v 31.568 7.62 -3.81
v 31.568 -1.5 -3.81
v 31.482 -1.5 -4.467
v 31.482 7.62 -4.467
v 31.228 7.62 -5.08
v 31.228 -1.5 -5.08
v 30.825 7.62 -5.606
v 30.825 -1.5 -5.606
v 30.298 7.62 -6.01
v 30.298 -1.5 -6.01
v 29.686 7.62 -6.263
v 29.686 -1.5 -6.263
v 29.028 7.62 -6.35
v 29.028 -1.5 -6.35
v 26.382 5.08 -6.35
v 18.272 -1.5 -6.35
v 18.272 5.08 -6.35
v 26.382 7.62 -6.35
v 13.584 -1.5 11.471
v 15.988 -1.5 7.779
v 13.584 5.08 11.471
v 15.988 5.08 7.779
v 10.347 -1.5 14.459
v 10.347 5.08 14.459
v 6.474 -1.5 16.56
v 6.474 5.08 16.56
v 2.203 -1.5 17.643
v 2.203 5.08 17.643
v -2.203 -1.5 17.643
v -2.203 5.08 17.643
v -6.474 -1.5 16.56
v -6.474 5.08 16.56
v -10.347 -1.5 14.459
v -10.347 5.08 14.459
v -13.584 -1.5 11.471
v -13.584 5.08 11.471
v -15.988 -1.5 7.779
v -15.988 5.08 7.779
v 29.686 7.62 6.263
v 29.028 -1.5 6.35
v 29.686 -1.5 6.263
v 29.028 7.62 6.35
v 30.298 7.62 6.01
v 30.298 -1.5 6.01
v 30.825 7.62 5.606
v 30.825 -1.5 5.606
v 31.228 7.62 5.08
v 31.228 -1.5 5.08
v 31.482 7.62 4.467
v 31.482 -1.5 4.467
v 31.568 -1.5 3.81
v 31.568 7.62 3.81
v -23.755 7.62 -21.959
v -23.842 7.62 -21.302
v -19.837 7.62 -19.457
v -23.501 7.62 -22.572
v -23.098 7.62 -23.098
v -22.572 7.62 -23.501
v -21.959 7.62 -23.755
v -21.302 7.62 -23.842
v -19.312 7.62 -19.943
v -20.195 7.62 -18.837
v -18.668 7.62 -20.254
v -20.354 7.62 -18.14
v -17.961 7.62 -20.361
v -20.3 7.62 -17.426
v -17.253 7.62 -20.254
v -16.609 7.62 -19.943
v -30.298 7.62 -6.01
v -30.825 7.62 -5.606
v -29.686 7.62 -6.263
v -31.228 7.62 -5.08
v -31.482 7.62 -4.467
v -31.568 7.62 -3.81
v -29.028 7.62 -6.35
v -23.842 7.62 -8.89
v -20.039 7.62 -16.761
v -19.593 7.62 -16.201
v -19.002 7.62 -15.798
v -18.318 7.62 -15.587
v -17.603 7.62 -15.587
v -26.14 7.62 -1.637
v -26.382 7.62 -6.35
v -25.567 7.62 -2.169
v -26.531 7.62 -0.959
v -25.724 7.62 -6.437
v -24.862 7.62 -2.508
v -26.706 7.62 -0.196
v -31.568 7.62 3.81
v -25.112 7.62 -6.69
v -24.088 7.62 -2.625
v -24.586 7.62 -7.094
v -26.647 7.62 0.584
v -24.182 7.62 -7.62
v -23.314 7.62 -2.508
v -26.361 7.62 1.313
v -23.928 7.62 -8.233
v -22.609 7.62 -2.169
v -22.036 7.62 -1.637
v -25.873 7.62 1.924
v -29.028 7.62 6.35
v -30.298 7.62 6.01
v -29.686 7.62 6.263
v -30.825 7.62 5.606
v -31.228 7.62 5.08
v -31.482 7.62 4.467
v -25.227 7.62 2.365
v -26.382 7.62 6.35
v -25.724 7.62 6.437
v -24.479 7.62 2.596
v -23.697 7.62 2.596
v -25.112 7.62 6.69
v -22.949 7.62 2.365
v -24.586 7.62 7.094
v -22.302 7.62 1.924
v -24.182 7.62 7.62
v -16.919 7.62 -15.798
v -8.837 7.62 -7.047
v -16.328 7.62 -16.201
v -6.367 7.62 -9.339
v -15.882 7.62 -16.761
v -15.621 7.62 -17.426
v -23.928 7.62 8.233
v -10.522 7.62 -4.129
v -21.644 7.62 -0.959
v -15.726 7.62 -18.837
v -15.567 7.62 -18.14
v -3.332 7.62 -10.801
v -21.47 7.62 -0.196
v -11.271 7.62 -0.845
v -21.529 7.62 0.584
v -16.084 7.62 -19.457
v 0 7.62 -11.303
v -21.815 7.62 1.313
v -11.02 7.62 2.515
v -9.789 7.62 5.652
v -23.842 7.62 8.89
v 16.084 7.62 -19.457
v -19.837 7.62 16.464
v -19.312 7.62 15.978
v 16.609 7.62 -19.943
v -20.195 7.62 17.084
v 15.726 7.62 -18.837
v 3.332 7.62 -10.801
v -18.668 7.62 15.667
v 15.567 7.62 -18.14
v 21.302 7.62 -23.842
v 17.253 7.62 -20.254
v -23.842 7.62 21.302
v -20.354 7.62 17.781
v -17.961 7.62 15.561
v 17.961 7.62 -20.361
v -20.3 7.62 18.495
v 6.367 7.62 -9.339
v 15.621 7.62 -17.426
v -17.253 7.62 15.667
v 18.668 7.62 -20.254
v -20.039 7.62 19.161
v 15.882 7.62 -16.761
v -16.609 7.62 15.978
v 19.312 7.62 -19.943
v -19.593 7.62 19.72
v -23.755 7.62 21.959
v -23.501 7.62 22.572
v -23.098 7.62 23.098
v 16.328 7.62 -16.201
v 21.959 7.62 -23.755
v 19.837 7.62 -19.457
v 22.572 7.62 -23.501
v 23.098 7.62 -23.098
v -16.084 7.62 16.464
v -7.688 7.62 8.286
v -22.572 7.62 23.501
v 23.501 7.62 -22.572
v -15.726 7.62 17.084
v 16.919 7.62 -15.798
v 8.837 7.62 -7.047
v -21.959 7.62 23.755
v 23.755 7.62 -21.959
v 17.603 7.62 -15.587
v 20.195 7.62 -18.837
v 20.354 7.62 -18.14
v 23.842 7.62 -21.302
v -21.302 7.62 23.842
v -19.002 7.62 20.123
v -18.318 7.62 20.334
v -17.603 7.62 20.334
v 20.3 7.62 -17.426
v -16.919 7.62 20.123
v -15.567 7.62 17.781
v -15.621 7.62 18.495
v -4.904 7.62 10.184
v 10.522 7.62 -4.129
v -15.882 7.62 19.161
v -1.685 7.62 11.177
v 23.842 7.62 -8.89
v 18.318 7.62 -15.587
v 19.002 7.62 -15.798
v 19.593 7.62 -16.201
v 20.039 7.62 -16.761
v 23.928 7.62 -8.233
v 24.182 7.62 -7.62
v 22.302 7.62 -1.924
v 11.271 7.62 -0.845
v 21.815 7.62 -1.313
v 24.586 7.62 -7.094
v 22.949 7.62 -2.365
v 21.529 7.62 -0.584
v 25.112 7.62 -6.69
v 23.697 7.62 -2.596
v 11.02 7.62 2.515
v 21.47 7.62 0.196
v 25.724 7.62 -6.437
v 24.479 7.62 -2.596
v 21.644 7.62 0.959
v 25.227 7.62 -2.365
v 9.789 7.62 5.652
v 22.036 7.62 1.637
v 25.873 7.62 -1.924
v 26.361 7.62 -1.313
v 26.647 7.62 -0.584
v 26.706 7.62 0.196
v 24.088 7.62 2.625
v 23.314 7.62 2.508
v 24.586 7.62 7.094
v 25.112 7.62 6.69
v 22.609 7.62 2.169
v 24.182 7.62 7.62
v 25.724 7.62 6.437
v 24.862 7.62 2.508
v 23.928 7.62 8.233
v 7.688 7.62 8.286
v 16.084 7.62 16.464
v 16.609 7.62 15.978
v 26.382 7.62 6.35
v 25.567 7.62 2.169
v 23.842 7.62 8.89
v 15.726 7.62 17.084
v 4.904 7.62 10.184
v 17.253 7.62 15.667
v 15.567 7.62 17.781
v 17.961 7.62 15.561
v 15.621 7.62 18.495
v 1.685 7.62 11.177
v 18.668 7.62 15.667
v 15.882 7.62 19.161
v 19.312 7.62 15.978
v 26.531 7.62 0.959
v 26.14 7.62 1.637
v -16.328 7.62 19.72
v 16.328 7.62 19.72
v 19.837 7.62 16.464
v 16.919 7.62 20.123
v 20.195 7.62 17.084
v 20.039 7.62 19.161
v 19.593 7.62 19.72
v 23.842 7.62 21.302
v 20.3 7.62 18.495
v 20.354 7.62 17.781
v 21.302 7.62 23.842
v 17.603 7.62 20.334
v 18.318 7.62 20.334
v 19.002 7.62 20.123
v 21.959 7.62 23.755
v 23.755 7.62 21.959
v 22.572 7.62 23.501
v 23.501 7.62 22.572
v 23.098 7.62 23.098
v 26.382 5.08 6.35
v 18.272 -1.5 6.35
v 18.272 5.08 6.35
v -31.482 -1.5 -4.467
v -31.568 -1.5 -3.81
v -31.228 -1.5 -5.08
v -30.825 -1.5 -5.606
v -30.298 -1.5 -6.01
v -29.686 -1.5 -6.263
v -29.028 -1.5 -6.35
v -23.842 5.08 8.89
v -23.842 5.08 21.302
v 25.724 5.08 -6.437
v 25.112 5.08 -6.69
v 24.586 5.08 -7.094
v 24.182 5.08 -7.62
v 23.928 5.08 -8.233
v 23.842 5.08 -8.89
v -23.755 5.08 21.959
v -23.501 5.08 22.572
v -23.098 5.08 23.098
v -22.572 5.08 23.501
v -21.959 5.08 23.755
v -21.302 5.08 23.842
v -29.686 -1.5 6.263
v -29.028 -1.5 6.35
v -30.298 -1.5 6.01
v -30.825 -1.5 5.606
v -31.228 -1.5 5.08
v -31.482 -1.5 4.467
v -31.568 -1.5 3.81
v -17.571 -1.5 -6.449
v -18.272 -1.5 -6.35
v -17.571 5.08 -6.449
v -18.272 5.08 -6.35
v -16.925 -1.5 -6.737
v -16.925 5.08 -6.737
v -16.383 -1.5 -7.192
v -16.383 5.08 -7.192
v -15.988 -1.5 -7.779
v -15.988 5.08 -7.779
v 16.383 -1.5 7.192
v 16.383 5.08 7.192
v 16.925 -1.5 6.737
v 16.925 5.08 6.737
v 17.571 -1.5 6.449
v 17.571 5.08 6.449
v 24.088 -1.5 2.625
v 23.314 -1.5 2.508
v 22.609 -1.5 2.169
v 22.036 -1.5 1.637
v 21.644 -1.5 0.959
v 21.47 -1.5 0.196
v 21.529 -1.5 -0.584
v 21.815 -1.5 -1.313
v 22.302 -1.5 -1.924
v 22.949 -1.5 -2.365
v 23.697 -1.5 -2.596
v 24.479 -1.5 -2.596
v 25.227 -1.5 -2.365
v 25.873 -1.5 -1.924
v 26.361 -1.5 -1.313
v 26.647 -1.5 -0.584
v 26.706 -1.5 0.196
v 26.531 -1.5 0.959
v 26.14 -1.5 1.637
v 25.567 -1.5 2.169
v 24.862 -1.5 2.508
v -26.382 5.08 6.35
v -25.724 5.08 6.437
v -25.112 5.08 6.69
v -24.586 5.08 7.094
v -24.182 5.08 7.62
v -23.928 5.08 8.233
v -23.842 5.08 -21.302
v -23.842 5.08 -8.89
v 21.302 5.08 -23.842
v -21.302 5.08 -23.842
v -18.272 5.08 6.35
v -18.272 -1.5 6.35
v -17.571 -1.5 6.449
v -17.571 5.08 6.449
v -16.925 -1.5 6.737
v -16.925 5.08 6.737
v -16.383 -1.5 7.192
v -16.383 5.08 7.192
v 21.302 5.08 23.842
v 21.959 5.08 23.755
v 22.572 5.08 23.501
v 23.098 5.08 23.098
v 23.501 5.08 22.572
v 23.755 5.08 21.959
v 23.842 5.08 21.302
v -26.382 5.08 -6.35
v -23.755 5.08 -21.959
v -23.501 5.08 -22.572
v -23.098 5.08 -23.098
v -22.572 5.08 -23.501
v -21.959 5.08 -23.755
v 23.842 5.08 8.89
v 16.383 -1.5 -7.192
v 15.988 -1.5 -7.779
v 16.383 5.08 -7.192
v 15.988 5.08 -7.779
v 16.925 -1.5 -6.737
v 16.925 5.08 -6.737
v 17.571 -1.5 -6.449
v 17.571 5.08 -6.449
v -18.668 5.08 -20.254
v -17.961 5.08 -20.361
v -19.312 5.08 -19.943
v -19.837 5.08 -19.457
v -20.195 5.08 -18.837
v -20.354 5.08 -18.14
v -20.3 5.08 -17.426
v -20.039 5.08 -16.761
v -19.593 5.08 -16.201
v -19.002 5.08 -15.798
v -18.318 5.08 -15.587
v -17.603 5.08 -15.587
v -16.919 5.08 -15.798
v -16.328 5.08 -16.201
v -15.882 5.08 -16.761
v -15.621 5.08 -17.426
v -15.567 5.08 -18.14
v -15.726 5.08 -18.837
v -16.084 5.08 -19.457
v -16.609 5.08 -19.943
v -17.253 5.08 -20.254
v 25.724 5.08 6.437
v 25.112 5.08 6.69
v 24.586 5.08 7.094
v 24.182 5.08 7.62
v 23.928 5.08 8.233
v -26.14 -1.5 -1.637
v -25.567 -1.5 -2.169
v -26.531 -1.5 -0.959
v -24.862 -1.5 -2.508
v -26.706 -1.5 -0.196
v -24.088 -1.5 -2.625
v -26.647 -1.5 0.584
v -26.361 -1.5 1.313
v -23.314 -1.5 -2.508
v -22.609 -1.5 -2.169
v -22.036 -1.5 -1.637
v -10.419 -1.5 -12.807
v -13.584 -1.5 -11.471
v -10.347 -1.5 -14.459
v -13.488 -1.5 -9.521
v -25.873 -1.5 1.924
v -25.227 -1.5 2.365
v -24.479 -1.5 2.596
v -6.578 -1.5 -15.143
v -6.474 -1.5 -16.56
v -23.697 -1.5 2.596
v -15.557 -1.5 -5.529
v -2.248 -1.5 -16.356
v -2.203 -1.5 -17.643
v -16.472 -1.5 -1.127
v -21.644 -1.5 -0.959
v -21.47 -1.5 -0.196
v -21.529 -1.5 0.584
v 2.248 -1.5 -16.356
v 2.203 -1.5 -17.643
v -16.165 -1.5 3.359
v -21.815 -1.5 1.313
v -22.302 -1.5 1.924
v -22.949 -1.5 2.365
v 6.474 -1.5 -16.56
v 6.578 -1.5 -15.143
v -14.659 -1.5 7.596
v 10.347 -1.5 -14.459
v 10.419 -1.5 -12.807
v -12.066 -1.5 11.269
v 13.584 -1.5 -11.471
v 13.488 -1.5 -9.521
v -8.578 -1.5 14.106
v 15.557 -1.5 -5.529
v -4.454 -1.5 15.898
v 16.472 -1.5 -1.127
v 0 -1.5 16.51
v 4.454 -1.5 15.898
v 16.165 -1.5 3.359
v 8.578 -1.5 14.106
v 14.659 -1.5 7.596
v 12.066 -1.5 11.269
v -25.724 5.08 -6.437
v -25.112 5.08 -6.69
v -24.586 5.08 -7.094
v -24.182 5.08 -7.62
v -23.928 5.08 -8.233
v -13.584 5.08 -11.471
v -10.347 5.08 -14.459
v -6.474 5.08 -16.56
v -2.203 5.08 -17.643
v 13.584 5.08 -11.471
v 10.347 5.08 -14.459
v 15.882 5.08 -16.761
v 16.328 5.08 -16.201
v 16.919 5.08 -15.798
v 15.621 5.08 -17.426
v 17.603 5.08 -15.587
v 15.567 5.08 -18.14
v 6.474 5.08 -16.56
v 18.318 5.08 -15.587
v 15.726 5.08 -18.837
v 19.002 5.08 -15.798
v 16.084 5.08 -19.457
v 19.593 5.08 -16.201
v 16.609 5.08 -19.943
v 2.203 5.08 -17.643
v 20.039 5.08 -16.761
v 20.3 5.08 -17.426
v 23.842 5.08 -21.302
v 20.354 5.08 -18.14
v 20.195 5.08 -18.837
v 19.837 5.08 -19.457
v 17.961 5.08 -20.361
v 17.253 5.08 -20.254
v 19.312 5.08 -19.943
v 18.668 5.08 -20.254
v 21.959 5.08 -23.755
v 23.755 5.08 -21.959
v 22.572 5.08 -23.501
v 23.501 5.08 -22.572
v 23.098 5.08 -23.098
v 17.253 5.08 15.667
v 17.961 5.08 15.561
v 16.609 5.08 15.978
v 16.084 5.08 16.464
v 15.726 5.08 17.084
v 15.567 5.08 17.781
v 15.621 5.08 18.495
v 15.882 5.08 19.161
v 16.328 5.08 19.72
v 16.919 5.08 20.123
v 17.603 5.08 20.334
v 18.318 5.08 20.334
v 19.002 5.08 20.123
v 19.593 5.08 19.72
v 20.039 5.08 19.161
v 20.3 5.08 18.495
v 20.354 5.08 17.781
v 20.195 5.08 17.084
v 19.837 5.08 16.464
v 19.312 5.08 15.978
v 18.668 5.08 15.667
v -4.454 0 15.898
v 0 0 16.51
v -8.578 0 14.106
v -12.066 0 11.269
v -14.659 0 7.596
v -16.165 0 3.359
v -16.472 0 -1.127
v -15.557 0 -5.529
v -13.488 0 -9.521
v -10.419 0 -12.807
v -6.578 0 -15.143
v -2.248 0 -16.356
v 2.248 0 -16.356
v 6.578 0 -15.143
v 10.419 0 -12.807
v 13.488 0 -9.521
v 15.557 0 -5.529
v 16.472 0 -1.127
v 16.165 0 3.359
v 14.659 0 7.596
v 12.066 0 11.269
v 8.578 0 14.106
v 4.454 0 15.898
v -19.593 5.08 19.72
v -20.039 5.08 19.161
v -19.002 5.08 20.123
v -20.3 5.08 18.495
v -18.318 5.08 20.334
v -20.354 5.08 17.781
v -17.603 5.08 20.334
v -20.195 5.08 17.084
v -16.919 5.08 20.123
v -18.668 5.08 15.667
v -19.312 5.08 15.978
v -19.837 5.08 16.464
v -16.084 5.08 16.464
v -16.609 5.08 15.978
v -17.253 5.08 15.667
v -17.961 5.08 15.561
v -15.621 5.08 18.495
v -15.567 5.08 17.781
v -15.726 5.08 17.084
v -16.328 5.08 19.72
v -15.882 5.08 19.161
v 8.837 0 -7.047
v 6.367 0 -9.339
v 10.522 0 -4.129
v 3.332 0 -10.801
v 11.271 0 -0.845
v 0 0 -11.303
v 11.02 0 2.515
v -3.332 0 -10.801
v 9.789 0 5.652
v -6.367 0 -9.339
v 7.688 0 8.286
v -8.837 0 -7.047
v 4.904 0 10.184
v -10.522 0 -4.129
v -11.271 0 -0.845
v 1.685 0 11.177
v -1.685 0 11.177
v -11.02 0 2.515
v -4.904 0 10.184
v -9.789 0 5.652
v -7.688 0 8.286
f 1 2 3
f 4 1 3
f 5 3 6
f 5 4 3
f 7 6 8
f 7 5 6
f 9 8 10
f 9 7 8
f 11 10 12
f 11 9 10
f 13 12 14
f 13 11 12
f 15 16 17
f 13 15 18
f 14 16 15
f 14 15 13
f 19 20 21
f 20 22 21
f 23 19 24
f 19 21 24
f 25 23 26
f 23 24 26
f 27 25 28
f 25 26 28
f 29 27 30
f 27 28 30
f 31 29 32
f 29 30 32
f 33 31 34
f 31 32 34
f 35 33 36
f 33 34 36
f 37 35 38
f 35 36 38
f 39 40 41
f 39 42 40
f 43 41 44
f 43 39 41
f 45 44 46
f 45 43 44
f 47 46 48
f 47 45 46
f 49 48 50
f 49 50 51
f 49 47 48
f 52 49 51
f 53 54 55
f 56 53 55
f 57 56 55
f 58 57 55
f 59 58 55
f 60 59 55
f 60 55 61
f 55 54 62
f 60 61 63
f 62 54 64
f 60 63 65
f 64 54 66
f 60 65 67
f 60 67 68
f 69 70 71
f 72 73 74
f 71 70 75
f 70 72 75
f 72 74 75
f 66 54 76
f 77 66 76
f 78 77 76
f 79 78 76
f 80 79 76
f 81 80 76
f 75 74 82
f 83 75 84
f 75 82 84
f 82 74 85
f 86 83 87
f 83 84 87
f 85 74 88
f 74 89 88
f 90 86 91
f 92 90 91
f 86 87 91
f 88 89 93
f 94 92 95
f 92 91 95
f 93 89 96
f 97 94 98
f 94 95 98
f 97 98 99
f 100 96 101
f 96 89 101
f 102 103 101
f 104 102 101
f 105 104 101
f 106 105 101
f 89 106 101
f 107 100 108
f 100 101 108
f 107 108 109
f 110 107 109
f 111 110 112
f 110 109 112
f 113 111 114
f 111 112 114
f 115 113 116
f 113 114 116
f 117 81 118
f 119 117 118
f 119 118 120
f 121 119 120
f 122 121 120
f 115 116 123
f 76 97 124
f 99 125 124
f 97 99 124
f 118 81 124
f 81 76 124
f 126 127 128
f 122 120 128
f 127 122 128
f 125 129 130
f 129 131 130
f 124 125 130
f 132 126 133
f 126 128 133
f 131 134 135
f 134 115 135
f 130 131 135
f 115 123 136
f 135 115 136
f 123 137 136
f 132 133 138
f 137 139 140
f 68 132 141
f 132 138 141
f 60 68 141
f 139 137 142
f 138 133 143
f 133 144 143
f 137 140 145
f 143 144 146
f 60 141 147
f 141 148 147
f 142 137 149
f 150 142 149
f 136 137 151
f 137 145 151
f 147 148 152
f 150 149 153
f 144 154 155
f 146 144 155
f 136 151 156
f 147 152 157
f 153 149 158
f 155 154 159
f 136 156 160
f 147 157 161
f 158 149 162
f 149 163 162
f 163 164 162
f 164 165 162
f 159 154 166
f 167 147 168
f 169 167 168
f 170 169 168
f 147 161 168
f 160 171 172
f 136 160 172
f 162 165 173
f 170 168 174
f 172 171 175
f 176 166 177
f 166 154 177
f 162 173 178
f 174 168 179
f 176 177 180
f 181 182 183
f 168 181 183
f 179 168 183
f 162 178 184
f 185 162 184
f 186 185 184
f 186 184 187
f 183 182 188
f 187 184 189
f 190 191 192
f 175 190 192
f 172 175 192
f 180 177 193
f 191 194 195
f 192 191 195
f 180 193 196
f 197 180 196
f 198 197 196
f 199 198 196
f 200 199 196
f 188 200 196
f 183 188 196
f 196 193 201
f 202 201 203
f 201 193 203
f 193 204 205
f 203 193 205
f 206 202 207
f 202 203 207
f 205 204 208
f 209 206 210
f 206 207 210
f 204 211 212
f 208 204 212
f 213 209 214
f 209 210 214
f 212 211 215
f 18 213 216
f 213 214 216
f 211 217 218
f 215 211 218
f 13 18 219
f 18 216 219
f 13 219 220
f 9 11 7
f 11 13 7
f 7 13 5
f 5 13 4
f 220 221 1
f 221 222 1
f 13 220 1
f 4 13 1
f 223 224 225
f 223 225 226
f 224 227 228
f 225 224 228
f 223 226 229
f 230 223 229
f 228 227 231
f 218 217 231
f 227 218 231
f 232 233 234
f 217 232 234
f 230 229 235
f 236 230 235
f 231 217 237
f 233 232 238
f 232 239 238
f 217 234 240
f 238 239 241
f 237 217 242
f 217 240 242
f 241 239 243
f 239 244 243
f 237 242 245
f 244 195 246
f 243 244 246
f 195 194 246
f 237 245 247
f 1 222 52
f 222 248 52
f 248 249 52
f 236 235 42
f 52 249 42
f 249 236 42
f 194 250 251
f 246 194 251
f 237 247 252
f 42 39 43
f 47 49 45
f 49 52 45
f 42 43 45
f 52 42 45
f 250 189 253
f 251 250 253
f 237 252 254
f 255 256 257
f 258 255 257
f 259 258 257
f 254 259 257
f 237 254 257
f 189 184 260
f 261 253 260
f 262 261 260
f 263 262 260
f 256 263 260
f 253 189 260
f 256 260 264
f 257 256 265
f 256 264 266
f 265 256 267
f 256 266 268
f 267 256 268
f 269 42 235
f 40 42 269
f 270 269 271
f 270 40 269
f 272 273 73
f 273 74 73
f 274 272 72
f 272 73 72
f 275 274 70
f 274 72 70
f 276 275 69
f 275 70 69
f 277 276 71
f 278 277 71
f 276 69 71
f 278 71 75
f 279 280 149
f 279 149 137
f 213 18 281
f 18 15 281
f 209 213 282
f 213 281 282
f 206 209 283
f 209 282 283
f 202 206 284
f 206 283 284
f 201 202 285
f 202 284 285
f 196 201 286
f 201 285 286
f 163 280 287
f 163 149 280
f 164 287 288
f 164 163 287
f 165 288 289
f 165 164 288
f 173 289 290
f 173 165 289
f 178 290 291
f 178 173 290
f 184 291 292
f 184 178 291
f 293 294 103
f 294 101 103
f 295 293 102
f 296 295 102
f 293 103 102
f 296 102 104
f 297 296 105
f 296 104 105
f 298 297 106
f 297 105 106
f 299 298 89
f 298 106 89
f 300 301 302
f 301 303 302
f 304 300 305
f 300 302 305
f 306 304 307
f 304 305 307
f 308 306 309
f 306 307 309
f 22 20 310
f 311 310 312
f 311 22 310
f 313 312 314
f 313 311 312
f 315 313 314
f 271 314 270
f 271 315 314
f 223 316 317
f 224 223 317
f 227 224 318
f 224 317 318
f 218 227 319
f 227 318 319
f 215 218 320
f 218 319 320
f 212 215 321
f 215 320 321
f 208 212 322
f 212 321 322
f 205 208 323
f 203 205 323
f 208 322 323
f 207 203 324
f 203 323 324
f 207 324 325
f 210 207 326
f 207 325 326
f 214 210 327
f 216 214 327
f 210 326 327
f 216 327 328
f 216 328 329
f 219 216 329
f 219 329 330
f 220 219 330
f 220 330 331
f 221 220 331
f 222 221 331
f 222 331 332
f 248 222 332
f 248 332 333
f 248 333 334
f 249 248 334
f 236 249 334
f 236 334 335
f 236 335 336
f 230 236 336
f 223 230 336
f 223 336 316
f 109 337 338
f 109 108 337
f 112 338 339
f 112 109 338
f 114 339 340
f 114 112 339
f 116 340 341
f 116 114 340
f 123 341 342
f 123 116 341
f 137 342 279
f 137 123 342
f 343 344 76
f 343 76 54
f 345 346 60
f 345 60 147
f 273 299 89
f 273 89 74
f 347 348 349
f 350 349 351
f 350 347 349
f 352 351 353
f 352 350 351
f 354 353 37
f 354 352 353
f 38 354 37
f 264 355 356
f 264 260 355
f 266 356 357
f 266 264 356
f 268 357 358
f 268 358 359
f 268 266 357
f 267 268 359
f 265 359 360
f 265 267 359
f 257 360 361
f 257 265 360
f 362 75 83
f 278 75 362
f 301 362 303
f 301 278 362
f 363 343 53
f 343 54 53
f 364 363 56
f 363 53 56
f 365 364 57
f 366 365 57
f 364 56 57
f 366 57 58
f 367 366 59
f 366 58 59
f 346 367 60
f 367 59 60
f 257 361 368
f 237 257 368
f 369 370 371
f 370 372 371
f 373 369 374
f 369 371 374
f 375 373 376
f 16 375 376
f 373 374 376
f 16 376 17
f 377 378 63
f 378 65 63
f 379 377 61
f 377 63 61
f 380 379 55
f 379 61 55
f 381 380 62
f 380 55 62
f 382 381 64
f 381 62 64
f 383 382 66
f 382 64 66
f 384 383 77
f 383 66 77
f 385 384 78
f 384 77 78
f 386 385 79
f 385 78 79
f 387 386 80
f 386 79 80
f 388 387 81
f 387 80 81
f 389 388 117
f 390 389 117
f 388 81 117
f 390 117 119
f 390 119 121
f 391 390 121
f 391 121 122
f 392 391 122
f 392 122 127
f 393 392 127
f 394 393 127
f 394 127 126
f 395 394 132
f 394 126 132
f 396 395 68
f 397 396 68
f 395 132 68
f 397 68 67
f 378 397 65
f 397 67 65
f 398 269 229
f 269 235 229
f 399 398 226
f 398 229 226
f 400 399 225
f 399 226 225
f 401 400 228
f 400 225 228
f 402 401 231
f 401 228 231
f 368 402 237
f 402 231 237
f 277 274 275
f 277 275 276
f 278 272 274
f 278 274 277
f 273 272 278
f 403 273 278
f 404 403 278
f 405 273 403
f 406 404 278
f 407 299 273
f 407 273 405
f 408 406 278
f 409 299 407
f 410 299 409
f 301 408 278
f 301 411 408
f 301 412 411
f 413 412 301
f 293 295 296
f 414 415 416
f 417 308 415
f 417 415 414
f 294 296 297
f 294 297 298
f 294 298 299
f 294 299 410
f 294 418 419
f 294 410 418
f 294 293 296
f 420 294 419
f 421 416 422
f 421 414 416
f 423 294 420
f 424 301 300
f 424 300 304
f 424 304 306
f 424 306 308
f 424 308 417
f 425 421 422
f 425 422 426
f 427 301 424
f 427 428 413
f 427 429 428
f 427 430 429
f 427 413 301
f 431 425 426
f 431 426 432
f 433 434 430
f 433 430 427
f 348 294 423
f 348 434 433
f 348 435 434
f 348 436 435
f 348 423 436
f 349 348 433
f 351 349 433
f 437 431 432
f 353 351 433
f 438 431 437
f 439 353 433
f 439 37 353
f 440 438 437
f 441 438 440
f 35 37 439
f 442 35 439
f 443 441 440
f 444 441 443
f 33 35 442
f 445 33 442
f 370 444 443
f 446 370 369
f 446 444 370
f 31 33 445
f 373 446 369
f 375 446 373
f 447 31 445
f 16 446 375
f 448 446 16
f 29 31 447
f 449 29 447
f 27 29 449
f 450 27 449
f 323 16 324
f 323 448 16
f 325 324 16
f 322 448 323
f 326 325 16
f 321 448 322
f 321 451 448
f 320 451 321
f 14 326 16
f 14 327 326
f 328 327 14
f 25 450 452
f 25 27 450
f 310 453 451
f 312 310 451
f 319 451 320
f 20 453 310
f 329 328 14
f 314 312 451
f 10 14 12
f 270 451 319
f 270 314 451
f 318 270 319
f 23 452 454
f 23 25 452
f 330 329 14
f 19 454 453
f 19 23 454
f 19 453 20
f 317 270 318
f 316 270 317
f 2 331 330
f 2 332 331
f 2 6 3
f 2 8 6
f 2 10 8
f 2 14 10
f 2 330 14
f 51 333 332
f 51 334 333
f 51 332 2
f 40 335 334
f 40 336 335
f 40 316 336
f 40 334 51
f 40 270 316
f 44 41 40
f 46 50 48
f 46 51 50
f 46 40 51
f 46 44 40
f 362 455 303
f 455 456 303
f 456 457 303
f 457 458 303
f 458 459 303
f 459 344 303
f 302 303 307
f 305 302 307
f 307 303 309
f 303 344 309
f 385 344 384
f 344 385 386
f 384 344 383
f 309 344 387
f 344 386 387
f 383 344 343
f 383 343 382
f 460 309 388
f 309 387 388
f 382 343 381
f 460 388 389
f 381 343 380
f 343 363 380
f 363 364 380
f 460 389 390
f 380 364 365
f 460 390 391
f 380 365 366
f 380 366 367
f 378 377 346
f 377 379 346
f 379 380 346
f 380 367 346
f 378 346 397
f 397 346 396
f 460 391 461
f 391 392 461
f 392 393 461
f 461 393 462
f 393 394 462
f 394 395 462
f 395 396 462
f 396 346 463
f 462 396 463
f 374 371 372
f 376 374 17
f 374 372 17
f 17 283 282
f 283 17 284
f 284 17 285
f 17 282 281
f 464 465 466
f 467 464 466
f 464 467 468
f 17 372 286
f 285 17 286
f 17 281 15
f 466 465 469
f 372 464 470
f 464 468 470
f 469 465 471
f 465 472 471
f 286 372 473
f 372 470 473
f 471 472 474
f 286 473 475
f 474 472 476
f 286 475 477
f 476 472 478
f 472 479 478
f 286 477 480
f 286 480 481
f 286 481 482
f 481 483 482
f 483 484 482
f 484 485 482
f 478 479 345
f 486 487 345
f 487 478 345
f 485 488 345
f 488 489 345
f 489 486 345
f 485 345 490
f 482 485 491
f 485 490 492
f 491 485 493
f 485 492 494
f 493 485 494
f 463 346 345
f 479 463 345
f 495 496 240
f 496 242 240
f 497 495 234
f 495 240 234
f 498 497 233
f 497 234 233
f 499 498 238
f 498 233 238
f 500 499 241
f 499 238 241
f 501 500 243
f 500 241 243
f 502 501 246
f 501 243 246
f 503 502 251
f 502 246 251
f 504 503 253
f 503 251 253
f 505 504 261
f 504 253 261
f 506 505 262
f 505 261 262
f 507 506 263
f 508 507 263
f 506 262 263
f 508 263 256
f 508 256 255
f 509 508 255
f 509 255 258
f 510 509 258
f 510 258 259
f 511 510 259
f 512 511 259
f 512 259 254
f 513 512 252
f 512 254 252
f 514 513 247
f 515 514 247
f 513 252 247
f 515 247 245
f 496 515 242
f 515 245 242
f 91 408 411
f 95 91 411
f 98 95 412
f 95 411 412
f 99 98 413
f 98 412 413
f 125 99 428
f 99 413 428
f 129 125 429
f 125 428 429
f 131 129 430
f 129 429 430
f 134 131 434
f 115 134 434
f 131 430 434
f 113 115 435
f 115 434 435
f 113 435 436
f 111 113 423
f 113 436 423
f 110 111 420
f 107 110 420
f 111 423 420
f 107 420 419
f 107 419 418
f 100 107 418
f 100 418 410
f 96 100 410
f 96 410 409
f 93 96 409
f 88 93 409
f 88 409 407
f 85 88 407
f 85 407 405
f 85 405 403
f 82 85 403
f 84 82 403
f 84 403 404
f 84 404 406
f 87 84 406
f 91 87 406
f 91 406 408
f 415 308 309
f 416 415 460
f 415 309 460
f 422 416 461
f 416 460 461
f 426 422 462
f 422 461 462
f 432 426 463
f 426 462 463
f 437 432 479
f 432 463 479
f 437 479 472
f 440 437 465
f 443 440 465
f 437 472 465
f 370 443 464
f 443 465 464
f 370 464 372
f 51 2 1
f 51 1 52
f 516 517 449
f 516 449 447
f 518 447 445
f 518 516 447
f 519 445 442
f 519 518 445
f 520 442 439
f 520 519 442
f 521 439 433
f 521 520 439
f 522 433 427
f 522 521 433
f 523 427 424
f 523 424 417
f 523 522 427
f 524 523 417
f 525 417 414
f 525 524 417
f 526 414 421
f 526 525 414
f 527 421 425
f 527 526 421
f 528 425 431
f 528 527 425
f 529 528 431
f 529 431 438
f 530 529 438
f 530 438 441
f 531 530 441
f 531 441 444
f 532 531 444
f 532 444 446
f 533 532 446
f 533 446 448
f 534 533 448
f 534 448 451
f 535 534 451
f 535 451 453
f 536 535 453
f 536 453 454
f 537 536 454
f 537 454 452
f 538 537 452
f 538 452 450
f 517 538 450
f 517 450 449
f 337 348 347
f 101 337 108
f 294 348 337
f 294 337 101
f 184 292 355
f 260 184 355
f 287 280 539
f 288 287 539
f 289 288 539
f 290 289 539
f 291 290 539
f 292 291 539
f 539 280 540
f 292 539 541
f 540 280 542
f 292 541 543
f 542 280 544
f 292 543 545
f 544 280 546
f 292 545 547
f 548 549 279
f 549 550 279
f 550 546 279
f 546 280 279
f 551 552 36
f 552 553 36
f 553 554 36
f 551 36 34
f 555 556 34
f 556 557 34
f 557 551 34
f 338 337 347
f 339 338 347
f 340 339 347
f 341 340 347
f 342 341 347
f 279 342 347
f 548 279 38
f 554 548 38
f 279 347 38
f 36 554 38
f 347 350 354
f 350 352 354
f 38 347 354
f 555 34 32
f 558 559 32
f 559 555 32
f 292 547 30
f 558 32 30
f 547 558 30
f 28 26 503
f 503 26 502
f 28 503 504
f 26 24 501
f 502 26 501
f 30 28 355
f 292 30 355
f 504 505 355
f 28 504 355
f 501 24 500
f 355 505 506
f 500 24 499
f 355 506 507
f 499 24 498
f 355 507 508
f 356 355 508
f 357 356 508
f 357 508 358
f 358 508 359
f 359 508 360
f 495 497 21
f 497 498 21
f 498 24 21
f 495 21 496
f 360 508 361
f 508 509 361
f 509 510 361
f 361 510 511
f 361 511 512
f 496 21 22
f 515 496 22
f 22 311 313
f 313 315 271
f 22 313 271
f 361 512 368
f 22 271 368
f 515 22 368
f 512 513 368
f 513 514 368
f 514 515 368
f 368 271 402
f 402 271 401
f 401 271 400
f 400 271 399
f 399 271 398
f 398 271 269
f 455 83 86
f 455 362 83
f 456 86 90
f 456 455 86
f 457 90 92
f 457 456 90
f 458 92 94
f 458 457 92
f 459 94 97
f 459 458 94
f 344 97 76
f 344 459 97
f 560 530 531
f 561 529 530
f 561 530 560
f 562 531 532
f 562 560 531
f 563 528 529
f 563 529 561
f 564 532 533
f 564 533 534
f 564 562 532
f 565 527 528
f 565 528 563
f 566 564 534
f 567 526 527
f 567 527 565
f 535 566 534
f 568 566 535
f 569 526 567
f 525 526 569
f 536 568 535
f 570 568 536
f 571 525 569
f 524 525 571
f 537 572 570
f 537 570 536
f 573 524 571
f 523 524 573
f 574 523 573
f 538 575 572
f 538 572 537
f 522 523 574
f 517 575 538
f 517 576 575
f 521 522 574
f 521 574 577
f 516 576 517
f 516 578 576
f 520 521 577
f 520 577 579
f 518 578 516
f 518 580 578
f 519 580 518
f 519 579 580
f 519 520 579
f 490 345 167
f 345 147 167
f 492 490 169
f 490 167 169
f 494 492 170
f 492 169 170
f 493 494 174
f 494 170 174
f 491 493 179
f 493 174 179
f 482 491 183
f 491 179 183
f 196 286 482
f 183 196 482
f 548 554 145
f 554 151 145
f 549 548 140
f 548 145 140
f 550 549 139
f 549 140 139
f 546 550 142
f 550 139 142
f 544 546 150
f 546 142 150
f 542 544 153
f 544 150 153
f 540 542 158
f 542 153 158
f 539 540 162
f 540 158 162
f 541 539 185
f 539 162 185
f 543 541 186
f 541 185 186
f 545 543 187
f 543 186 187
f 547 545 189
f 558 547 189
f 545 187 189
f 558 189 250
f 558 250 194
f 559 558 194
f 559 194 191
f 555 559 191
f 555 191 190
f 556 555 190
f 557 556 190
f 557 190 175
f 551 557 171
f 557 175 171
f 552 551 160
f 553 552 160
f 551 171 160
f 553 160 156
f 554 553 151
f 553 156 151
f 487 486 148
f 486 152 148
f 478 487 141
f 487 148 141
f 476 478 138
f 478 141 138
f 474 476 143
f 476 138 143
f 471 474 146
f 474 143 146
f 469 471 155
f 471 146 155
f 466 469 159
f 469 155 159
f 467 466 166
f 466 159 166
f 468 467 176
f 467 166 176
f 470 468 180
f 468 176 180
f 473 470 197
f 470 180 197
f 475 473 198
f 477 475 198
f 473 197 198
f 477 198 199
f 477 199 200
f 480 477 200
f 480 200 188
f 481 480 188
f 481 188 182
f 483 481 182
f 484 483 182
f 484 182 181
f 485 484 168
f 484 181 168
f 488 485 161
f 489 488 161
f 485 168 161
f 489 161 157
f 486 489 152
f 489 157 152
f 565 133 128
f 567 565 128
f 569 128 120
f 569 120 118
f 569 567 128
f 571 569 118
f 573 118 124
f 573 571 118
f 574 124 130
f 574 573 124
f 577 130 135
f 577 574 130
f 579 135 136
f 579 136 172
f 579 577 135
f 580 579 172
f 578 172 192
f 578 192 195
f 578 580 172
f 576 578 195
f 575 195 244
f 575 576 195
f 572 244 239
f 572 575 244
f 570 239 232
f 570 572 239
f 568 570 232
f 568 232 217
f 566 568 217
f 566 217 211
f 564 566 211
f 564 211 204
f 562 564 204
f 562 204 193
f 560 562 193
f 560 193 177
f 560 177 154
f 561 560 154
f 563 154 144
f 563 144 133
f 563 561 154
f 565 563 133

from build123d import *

# Parameters (mm, degrees)
SKETCH1_R                     = 13.843
SKETCH1_R_2                   = 11.303
BOSS_EXTRUDE1_DEPTH           = 7.62
BOSS_EXTRUDE4_DEPTH           = 1.5
BOSS_EXTRUDE4_DEPTH_BACK      = 7.62
SKETCH6_R                     = 17.78
SKETCH6_R_2                   = 16.51
BOSS_EXTRUDE5_DEPTH           = 9.12
BOSS_EXTRUDE6_START           = -2.54
BOSS_EXTRUDE6_OUTLINE_W       = 47.683186112
BOSS_EXTRUDE6_OUTLINE_H       = 47.683186112
BOSS_EXTRUDE6_OUTLINE_R       = 0.801080814
BOSS_EXTRUDE6_OUTLINE_R_2     = 13.843
BOSS_EXTRUDE6_DEPTH           = 2.54
SKETCH11_W                    = 2.4
SKETCH11_H                    = 2.54
M4_CLEARANCE_HOLE2_AT_2_COUNT = 2
M4_CLEARANCE_HOLE2_AT_2_PITCH = 35.921024484
M4_CLEARANCE_HOLE2_AT_3_COUNT = 2
M4_CLEARANCE_HOLE2_AT_3_PITCH = 50.8
M4_CLEARANCE_HOLE2_AT_4_COUNT = 2
M4_CLEARANCE_HOLE2_AT_4_PITCH = 35.921024484
FILLET1_R                     = 2.54
BOSS_EXTRUDE7_START           = 5.08
SKETCH12_R                    = 16.51
SKETCH12_R_2                  = 13.843
BOSS_EXTRUDE7_DEPTH           = 5.08
SKETCH8_R                     = 2.625
CUT_EXTRUDE2_DEPTH            = 41.597607221
FILLET2_R                     = 2.54


# Read off the part's stored shape, not the designer's step: Boss-Extrude6
with BuildPart() as part:
    # Sketch1 → Boss-Extrude1 (new body)
    with BuildSketch(Plane(origin=(0, 0, 0), x_dir=(1, 0, 0), z_dir=(0, 1, 0))):
        with Locations(Location((0, 0, 0), (0, 0, 90))):
            Circle(SKETCH1_R)
        with Locations(Location((0, 0, 0), (0, 0, 90))):
            Circle(SKETCH1_R_2, mode=Mode.SUBTRACT)
    extrude(amount=BOSS_EXTRUDE1_DEPTH)

    # Boss-Extrude6 outline → Boss-Extrude6 (add)
    with BuildSketch(Plane(origin=(0, 7.62, 0), x_dir=(1, 0, 0), z_dir=(0, 1, 0)).offset(BOSS_EXTRUDE6_START)):
        Rectangle(BOSS_EXTRUDE6_OUTLINE_W, BOSS_EXTRUDE6_OUTLINE_H)
        with Locations((-17.960512242, -17.960512242)):
            Circle(BOSS_EXTRUDE6_OUTLINE_R, mode=Mode.SUBTRACT)
        with Locations((17.960512242, -17.960512242)):
            Circle(BOSS_EXTRUDE6_OUTLINE_R, mode=Mode.SUBTRACT)
        with Locations((-17.960512242, 17.960512242)):
            Circle(BOSS_EXTRUDE6_OUTLINE_R, mode=Mode.SUBTRACT)
        Circle(BOSS_EXTRUDE6_OUTLINE_R_2, mode=Mode.SUBTRACT)
        with Locations((17.960512242, 17.960512242)):
            Circle(BOSS_EXTRUDE6_OUTLINE_R, mode=Mode.SUBTRACT)
    extrude(amount=BOSS_EXTRUDE6_DEPTH)

    # Sketch11 → M4 Clearance Hole2 (revolve, cut)
    with BuildSketch(Plane(origin=(17.960512242, 5.08, -17.960512242), x_dir=(0, 0, -1), z_dir=(1, 0, 0))):
        with Locations((1.2, 1.27)):
            Rectangle(SKETCH11_W, SKETCH11_H)
    m4_clearance_hole2 = revolve(axis=Axis((17.960512242, -1.27, -17.960512242), (0, 1, 0)), mode=Mode.SUBTRACT)

    # M4 Clearance Hole2 at 2: M4 Clearance Hole2 ×2
    with Locations(*[(-i * M4_CLEARANCE_HOLE2_AT_2_PITCH, 0, 0) for i in range(1, M4_CLEARANCE_HOLE2_AT_2_COUNT)]):
        add(m4_clearance_hole2, mode=Mode.SUBTRACT)

    # M4 Clearance Hole2 at 3: M4 Clearance Hole2 ×2
    with Locations(*[Vector(-0.7071067811865477, 0, 0.7071067811865475) * (i * M4_CLEARANCE_HOLE2_AT_3_PITCH) for i in range(1, M4_CLEARANCE_HOLE2_AT_3_COUNT)]):
        add(m4_clearance_hole2, mode=Mode.SUBTRACT)

    # M4 Clearance Hole2 at 4: M4 Clearance Hole2 ×2
    with Locations(*[(0, 0, i * M4_CLEARANCE_HOLE2_AT_4_PITCH) for i in range(1, M4_CLEARANCE_HOLE2_AT_4_COUNT)]):
        add(m4_clearance_hole2, mode=Mode.SUBTRACT)

    # Fillet1
    fillet1_edges = [part.edges().sort_by_distance(p)[0] for p in [
        (23.841593056, 6.35, -23.841593056),
        (23.841593056, 6.35, 23.841593056),
        (-23.841593056, 6.35, 23.841593056),
        (-23.841593056, 6.35, -23.841593056),
    ]]
    fillet(fillet1_edges, radius=FILLET1_R)



with BuildPart() as body_2:
    # Sketch6 → Boss-Extrude4 (new, two sides: drawn at the far end of the back side and taken through both)
    with BuildSketch(Plane.XZ.offset(-BOSS_EXTRUDE4_DEPTH_BACK)):
        with Locations(Location((0, 0, 0), (0, 0, 90))):
            Circle(SKETCH6_R)
        with Locations(Location((0, 0, 0), (0, 0, 90))):
            Circle(SKETCH6_R_2, mode=Mode.SUBTRACT)
    extrude(amount=BOSS_EXTRUDE4_DEPTH + BOSS_EXTRUDE4_DEPTH_BACK)

    # Sketch7 → Boss-Extrude5 (add)
    with BuildSketch(Plane.XZ.offset(1.5)):
        Polygon((-18.868493037, 6.35), (-31.568493037, 6.35), (-31.568493037, -6.35), (-18.868493037, -6.35), (-16.578258023, -6.35), (-16.578258023, 6.35), align=None)
        Polygon((18.868493037, 6.35), (16.578258023, 6.35), (16.578258023, -6.35), (18.868493037, -6.35), (31.568493037, -6.35), (31.568493037, 6.35), align=None)
    extrude(amount=-BOSS_EXTRUDE5_DEPTH)


with BuildPart() as part_1:
    add(part.part)

    add(body_2.part)  # Boss-Extrude7 merges body 2
    # Sketch12 → Boss-Extrude7 (add)
    with BuildSketch(Plane.XZ.offset(-5.08).offset(BOSS_EXTRUDE7_START)):
        with Locations(Location((0, 0, 0), (0, 0, 90))):
            Circle(SKETCH12_R)
        Circle(SKETCH12_R_2, mode=Mode.SUBTRACT)
    extrude(amount=-BOSS_EXTRUDE7_DEPTH)

    # Sketch8 → Cut-Extrude2 (cut, through all)
    with BuildSketch(Plane.XZ.offset(1.5)):
        with Locations(Location((-24.087949006, 0, 0), (0, 0, 270))):
            Circle(SKETCH8_R)
        with Locations(Location((24.087949006, 0, 0), (0, 0, 90))):
            Circle(SKETCH8_R)
    extrude(amount=-CUT_EXTRUDE2_DEPTH, mode=Mode.SUBTRACT)

    # Fillet2
    fillet2_edges = [part_1.edges().sort_by_distance(p)[0] for p in [
        (-31.568493037, 3.06, 6.35),
        (-31.568493037, 3.06, -6.35),
        (-16.607404975, 1.79, -6.35),
        (31.568493037, 3.06, -6.35),
        (16.607404975, 1.79, 6.35),
        (31.568493037, 3.06, 6.35),
        (16.607404975, 1.79, -6.35),
        (23.841593056, 6.35, -6.35),
        (-23.841593056, 6.35, -6.35),
        (-16.607404975, 1.79, 6.35),
        (-23.841593056, 6.35, 6.35),
        (23.841593056, 6.35, 6.35),
    ]]
    fillet(fillet2_edges, radius=FILLET2_R)


solid = part_1.part
